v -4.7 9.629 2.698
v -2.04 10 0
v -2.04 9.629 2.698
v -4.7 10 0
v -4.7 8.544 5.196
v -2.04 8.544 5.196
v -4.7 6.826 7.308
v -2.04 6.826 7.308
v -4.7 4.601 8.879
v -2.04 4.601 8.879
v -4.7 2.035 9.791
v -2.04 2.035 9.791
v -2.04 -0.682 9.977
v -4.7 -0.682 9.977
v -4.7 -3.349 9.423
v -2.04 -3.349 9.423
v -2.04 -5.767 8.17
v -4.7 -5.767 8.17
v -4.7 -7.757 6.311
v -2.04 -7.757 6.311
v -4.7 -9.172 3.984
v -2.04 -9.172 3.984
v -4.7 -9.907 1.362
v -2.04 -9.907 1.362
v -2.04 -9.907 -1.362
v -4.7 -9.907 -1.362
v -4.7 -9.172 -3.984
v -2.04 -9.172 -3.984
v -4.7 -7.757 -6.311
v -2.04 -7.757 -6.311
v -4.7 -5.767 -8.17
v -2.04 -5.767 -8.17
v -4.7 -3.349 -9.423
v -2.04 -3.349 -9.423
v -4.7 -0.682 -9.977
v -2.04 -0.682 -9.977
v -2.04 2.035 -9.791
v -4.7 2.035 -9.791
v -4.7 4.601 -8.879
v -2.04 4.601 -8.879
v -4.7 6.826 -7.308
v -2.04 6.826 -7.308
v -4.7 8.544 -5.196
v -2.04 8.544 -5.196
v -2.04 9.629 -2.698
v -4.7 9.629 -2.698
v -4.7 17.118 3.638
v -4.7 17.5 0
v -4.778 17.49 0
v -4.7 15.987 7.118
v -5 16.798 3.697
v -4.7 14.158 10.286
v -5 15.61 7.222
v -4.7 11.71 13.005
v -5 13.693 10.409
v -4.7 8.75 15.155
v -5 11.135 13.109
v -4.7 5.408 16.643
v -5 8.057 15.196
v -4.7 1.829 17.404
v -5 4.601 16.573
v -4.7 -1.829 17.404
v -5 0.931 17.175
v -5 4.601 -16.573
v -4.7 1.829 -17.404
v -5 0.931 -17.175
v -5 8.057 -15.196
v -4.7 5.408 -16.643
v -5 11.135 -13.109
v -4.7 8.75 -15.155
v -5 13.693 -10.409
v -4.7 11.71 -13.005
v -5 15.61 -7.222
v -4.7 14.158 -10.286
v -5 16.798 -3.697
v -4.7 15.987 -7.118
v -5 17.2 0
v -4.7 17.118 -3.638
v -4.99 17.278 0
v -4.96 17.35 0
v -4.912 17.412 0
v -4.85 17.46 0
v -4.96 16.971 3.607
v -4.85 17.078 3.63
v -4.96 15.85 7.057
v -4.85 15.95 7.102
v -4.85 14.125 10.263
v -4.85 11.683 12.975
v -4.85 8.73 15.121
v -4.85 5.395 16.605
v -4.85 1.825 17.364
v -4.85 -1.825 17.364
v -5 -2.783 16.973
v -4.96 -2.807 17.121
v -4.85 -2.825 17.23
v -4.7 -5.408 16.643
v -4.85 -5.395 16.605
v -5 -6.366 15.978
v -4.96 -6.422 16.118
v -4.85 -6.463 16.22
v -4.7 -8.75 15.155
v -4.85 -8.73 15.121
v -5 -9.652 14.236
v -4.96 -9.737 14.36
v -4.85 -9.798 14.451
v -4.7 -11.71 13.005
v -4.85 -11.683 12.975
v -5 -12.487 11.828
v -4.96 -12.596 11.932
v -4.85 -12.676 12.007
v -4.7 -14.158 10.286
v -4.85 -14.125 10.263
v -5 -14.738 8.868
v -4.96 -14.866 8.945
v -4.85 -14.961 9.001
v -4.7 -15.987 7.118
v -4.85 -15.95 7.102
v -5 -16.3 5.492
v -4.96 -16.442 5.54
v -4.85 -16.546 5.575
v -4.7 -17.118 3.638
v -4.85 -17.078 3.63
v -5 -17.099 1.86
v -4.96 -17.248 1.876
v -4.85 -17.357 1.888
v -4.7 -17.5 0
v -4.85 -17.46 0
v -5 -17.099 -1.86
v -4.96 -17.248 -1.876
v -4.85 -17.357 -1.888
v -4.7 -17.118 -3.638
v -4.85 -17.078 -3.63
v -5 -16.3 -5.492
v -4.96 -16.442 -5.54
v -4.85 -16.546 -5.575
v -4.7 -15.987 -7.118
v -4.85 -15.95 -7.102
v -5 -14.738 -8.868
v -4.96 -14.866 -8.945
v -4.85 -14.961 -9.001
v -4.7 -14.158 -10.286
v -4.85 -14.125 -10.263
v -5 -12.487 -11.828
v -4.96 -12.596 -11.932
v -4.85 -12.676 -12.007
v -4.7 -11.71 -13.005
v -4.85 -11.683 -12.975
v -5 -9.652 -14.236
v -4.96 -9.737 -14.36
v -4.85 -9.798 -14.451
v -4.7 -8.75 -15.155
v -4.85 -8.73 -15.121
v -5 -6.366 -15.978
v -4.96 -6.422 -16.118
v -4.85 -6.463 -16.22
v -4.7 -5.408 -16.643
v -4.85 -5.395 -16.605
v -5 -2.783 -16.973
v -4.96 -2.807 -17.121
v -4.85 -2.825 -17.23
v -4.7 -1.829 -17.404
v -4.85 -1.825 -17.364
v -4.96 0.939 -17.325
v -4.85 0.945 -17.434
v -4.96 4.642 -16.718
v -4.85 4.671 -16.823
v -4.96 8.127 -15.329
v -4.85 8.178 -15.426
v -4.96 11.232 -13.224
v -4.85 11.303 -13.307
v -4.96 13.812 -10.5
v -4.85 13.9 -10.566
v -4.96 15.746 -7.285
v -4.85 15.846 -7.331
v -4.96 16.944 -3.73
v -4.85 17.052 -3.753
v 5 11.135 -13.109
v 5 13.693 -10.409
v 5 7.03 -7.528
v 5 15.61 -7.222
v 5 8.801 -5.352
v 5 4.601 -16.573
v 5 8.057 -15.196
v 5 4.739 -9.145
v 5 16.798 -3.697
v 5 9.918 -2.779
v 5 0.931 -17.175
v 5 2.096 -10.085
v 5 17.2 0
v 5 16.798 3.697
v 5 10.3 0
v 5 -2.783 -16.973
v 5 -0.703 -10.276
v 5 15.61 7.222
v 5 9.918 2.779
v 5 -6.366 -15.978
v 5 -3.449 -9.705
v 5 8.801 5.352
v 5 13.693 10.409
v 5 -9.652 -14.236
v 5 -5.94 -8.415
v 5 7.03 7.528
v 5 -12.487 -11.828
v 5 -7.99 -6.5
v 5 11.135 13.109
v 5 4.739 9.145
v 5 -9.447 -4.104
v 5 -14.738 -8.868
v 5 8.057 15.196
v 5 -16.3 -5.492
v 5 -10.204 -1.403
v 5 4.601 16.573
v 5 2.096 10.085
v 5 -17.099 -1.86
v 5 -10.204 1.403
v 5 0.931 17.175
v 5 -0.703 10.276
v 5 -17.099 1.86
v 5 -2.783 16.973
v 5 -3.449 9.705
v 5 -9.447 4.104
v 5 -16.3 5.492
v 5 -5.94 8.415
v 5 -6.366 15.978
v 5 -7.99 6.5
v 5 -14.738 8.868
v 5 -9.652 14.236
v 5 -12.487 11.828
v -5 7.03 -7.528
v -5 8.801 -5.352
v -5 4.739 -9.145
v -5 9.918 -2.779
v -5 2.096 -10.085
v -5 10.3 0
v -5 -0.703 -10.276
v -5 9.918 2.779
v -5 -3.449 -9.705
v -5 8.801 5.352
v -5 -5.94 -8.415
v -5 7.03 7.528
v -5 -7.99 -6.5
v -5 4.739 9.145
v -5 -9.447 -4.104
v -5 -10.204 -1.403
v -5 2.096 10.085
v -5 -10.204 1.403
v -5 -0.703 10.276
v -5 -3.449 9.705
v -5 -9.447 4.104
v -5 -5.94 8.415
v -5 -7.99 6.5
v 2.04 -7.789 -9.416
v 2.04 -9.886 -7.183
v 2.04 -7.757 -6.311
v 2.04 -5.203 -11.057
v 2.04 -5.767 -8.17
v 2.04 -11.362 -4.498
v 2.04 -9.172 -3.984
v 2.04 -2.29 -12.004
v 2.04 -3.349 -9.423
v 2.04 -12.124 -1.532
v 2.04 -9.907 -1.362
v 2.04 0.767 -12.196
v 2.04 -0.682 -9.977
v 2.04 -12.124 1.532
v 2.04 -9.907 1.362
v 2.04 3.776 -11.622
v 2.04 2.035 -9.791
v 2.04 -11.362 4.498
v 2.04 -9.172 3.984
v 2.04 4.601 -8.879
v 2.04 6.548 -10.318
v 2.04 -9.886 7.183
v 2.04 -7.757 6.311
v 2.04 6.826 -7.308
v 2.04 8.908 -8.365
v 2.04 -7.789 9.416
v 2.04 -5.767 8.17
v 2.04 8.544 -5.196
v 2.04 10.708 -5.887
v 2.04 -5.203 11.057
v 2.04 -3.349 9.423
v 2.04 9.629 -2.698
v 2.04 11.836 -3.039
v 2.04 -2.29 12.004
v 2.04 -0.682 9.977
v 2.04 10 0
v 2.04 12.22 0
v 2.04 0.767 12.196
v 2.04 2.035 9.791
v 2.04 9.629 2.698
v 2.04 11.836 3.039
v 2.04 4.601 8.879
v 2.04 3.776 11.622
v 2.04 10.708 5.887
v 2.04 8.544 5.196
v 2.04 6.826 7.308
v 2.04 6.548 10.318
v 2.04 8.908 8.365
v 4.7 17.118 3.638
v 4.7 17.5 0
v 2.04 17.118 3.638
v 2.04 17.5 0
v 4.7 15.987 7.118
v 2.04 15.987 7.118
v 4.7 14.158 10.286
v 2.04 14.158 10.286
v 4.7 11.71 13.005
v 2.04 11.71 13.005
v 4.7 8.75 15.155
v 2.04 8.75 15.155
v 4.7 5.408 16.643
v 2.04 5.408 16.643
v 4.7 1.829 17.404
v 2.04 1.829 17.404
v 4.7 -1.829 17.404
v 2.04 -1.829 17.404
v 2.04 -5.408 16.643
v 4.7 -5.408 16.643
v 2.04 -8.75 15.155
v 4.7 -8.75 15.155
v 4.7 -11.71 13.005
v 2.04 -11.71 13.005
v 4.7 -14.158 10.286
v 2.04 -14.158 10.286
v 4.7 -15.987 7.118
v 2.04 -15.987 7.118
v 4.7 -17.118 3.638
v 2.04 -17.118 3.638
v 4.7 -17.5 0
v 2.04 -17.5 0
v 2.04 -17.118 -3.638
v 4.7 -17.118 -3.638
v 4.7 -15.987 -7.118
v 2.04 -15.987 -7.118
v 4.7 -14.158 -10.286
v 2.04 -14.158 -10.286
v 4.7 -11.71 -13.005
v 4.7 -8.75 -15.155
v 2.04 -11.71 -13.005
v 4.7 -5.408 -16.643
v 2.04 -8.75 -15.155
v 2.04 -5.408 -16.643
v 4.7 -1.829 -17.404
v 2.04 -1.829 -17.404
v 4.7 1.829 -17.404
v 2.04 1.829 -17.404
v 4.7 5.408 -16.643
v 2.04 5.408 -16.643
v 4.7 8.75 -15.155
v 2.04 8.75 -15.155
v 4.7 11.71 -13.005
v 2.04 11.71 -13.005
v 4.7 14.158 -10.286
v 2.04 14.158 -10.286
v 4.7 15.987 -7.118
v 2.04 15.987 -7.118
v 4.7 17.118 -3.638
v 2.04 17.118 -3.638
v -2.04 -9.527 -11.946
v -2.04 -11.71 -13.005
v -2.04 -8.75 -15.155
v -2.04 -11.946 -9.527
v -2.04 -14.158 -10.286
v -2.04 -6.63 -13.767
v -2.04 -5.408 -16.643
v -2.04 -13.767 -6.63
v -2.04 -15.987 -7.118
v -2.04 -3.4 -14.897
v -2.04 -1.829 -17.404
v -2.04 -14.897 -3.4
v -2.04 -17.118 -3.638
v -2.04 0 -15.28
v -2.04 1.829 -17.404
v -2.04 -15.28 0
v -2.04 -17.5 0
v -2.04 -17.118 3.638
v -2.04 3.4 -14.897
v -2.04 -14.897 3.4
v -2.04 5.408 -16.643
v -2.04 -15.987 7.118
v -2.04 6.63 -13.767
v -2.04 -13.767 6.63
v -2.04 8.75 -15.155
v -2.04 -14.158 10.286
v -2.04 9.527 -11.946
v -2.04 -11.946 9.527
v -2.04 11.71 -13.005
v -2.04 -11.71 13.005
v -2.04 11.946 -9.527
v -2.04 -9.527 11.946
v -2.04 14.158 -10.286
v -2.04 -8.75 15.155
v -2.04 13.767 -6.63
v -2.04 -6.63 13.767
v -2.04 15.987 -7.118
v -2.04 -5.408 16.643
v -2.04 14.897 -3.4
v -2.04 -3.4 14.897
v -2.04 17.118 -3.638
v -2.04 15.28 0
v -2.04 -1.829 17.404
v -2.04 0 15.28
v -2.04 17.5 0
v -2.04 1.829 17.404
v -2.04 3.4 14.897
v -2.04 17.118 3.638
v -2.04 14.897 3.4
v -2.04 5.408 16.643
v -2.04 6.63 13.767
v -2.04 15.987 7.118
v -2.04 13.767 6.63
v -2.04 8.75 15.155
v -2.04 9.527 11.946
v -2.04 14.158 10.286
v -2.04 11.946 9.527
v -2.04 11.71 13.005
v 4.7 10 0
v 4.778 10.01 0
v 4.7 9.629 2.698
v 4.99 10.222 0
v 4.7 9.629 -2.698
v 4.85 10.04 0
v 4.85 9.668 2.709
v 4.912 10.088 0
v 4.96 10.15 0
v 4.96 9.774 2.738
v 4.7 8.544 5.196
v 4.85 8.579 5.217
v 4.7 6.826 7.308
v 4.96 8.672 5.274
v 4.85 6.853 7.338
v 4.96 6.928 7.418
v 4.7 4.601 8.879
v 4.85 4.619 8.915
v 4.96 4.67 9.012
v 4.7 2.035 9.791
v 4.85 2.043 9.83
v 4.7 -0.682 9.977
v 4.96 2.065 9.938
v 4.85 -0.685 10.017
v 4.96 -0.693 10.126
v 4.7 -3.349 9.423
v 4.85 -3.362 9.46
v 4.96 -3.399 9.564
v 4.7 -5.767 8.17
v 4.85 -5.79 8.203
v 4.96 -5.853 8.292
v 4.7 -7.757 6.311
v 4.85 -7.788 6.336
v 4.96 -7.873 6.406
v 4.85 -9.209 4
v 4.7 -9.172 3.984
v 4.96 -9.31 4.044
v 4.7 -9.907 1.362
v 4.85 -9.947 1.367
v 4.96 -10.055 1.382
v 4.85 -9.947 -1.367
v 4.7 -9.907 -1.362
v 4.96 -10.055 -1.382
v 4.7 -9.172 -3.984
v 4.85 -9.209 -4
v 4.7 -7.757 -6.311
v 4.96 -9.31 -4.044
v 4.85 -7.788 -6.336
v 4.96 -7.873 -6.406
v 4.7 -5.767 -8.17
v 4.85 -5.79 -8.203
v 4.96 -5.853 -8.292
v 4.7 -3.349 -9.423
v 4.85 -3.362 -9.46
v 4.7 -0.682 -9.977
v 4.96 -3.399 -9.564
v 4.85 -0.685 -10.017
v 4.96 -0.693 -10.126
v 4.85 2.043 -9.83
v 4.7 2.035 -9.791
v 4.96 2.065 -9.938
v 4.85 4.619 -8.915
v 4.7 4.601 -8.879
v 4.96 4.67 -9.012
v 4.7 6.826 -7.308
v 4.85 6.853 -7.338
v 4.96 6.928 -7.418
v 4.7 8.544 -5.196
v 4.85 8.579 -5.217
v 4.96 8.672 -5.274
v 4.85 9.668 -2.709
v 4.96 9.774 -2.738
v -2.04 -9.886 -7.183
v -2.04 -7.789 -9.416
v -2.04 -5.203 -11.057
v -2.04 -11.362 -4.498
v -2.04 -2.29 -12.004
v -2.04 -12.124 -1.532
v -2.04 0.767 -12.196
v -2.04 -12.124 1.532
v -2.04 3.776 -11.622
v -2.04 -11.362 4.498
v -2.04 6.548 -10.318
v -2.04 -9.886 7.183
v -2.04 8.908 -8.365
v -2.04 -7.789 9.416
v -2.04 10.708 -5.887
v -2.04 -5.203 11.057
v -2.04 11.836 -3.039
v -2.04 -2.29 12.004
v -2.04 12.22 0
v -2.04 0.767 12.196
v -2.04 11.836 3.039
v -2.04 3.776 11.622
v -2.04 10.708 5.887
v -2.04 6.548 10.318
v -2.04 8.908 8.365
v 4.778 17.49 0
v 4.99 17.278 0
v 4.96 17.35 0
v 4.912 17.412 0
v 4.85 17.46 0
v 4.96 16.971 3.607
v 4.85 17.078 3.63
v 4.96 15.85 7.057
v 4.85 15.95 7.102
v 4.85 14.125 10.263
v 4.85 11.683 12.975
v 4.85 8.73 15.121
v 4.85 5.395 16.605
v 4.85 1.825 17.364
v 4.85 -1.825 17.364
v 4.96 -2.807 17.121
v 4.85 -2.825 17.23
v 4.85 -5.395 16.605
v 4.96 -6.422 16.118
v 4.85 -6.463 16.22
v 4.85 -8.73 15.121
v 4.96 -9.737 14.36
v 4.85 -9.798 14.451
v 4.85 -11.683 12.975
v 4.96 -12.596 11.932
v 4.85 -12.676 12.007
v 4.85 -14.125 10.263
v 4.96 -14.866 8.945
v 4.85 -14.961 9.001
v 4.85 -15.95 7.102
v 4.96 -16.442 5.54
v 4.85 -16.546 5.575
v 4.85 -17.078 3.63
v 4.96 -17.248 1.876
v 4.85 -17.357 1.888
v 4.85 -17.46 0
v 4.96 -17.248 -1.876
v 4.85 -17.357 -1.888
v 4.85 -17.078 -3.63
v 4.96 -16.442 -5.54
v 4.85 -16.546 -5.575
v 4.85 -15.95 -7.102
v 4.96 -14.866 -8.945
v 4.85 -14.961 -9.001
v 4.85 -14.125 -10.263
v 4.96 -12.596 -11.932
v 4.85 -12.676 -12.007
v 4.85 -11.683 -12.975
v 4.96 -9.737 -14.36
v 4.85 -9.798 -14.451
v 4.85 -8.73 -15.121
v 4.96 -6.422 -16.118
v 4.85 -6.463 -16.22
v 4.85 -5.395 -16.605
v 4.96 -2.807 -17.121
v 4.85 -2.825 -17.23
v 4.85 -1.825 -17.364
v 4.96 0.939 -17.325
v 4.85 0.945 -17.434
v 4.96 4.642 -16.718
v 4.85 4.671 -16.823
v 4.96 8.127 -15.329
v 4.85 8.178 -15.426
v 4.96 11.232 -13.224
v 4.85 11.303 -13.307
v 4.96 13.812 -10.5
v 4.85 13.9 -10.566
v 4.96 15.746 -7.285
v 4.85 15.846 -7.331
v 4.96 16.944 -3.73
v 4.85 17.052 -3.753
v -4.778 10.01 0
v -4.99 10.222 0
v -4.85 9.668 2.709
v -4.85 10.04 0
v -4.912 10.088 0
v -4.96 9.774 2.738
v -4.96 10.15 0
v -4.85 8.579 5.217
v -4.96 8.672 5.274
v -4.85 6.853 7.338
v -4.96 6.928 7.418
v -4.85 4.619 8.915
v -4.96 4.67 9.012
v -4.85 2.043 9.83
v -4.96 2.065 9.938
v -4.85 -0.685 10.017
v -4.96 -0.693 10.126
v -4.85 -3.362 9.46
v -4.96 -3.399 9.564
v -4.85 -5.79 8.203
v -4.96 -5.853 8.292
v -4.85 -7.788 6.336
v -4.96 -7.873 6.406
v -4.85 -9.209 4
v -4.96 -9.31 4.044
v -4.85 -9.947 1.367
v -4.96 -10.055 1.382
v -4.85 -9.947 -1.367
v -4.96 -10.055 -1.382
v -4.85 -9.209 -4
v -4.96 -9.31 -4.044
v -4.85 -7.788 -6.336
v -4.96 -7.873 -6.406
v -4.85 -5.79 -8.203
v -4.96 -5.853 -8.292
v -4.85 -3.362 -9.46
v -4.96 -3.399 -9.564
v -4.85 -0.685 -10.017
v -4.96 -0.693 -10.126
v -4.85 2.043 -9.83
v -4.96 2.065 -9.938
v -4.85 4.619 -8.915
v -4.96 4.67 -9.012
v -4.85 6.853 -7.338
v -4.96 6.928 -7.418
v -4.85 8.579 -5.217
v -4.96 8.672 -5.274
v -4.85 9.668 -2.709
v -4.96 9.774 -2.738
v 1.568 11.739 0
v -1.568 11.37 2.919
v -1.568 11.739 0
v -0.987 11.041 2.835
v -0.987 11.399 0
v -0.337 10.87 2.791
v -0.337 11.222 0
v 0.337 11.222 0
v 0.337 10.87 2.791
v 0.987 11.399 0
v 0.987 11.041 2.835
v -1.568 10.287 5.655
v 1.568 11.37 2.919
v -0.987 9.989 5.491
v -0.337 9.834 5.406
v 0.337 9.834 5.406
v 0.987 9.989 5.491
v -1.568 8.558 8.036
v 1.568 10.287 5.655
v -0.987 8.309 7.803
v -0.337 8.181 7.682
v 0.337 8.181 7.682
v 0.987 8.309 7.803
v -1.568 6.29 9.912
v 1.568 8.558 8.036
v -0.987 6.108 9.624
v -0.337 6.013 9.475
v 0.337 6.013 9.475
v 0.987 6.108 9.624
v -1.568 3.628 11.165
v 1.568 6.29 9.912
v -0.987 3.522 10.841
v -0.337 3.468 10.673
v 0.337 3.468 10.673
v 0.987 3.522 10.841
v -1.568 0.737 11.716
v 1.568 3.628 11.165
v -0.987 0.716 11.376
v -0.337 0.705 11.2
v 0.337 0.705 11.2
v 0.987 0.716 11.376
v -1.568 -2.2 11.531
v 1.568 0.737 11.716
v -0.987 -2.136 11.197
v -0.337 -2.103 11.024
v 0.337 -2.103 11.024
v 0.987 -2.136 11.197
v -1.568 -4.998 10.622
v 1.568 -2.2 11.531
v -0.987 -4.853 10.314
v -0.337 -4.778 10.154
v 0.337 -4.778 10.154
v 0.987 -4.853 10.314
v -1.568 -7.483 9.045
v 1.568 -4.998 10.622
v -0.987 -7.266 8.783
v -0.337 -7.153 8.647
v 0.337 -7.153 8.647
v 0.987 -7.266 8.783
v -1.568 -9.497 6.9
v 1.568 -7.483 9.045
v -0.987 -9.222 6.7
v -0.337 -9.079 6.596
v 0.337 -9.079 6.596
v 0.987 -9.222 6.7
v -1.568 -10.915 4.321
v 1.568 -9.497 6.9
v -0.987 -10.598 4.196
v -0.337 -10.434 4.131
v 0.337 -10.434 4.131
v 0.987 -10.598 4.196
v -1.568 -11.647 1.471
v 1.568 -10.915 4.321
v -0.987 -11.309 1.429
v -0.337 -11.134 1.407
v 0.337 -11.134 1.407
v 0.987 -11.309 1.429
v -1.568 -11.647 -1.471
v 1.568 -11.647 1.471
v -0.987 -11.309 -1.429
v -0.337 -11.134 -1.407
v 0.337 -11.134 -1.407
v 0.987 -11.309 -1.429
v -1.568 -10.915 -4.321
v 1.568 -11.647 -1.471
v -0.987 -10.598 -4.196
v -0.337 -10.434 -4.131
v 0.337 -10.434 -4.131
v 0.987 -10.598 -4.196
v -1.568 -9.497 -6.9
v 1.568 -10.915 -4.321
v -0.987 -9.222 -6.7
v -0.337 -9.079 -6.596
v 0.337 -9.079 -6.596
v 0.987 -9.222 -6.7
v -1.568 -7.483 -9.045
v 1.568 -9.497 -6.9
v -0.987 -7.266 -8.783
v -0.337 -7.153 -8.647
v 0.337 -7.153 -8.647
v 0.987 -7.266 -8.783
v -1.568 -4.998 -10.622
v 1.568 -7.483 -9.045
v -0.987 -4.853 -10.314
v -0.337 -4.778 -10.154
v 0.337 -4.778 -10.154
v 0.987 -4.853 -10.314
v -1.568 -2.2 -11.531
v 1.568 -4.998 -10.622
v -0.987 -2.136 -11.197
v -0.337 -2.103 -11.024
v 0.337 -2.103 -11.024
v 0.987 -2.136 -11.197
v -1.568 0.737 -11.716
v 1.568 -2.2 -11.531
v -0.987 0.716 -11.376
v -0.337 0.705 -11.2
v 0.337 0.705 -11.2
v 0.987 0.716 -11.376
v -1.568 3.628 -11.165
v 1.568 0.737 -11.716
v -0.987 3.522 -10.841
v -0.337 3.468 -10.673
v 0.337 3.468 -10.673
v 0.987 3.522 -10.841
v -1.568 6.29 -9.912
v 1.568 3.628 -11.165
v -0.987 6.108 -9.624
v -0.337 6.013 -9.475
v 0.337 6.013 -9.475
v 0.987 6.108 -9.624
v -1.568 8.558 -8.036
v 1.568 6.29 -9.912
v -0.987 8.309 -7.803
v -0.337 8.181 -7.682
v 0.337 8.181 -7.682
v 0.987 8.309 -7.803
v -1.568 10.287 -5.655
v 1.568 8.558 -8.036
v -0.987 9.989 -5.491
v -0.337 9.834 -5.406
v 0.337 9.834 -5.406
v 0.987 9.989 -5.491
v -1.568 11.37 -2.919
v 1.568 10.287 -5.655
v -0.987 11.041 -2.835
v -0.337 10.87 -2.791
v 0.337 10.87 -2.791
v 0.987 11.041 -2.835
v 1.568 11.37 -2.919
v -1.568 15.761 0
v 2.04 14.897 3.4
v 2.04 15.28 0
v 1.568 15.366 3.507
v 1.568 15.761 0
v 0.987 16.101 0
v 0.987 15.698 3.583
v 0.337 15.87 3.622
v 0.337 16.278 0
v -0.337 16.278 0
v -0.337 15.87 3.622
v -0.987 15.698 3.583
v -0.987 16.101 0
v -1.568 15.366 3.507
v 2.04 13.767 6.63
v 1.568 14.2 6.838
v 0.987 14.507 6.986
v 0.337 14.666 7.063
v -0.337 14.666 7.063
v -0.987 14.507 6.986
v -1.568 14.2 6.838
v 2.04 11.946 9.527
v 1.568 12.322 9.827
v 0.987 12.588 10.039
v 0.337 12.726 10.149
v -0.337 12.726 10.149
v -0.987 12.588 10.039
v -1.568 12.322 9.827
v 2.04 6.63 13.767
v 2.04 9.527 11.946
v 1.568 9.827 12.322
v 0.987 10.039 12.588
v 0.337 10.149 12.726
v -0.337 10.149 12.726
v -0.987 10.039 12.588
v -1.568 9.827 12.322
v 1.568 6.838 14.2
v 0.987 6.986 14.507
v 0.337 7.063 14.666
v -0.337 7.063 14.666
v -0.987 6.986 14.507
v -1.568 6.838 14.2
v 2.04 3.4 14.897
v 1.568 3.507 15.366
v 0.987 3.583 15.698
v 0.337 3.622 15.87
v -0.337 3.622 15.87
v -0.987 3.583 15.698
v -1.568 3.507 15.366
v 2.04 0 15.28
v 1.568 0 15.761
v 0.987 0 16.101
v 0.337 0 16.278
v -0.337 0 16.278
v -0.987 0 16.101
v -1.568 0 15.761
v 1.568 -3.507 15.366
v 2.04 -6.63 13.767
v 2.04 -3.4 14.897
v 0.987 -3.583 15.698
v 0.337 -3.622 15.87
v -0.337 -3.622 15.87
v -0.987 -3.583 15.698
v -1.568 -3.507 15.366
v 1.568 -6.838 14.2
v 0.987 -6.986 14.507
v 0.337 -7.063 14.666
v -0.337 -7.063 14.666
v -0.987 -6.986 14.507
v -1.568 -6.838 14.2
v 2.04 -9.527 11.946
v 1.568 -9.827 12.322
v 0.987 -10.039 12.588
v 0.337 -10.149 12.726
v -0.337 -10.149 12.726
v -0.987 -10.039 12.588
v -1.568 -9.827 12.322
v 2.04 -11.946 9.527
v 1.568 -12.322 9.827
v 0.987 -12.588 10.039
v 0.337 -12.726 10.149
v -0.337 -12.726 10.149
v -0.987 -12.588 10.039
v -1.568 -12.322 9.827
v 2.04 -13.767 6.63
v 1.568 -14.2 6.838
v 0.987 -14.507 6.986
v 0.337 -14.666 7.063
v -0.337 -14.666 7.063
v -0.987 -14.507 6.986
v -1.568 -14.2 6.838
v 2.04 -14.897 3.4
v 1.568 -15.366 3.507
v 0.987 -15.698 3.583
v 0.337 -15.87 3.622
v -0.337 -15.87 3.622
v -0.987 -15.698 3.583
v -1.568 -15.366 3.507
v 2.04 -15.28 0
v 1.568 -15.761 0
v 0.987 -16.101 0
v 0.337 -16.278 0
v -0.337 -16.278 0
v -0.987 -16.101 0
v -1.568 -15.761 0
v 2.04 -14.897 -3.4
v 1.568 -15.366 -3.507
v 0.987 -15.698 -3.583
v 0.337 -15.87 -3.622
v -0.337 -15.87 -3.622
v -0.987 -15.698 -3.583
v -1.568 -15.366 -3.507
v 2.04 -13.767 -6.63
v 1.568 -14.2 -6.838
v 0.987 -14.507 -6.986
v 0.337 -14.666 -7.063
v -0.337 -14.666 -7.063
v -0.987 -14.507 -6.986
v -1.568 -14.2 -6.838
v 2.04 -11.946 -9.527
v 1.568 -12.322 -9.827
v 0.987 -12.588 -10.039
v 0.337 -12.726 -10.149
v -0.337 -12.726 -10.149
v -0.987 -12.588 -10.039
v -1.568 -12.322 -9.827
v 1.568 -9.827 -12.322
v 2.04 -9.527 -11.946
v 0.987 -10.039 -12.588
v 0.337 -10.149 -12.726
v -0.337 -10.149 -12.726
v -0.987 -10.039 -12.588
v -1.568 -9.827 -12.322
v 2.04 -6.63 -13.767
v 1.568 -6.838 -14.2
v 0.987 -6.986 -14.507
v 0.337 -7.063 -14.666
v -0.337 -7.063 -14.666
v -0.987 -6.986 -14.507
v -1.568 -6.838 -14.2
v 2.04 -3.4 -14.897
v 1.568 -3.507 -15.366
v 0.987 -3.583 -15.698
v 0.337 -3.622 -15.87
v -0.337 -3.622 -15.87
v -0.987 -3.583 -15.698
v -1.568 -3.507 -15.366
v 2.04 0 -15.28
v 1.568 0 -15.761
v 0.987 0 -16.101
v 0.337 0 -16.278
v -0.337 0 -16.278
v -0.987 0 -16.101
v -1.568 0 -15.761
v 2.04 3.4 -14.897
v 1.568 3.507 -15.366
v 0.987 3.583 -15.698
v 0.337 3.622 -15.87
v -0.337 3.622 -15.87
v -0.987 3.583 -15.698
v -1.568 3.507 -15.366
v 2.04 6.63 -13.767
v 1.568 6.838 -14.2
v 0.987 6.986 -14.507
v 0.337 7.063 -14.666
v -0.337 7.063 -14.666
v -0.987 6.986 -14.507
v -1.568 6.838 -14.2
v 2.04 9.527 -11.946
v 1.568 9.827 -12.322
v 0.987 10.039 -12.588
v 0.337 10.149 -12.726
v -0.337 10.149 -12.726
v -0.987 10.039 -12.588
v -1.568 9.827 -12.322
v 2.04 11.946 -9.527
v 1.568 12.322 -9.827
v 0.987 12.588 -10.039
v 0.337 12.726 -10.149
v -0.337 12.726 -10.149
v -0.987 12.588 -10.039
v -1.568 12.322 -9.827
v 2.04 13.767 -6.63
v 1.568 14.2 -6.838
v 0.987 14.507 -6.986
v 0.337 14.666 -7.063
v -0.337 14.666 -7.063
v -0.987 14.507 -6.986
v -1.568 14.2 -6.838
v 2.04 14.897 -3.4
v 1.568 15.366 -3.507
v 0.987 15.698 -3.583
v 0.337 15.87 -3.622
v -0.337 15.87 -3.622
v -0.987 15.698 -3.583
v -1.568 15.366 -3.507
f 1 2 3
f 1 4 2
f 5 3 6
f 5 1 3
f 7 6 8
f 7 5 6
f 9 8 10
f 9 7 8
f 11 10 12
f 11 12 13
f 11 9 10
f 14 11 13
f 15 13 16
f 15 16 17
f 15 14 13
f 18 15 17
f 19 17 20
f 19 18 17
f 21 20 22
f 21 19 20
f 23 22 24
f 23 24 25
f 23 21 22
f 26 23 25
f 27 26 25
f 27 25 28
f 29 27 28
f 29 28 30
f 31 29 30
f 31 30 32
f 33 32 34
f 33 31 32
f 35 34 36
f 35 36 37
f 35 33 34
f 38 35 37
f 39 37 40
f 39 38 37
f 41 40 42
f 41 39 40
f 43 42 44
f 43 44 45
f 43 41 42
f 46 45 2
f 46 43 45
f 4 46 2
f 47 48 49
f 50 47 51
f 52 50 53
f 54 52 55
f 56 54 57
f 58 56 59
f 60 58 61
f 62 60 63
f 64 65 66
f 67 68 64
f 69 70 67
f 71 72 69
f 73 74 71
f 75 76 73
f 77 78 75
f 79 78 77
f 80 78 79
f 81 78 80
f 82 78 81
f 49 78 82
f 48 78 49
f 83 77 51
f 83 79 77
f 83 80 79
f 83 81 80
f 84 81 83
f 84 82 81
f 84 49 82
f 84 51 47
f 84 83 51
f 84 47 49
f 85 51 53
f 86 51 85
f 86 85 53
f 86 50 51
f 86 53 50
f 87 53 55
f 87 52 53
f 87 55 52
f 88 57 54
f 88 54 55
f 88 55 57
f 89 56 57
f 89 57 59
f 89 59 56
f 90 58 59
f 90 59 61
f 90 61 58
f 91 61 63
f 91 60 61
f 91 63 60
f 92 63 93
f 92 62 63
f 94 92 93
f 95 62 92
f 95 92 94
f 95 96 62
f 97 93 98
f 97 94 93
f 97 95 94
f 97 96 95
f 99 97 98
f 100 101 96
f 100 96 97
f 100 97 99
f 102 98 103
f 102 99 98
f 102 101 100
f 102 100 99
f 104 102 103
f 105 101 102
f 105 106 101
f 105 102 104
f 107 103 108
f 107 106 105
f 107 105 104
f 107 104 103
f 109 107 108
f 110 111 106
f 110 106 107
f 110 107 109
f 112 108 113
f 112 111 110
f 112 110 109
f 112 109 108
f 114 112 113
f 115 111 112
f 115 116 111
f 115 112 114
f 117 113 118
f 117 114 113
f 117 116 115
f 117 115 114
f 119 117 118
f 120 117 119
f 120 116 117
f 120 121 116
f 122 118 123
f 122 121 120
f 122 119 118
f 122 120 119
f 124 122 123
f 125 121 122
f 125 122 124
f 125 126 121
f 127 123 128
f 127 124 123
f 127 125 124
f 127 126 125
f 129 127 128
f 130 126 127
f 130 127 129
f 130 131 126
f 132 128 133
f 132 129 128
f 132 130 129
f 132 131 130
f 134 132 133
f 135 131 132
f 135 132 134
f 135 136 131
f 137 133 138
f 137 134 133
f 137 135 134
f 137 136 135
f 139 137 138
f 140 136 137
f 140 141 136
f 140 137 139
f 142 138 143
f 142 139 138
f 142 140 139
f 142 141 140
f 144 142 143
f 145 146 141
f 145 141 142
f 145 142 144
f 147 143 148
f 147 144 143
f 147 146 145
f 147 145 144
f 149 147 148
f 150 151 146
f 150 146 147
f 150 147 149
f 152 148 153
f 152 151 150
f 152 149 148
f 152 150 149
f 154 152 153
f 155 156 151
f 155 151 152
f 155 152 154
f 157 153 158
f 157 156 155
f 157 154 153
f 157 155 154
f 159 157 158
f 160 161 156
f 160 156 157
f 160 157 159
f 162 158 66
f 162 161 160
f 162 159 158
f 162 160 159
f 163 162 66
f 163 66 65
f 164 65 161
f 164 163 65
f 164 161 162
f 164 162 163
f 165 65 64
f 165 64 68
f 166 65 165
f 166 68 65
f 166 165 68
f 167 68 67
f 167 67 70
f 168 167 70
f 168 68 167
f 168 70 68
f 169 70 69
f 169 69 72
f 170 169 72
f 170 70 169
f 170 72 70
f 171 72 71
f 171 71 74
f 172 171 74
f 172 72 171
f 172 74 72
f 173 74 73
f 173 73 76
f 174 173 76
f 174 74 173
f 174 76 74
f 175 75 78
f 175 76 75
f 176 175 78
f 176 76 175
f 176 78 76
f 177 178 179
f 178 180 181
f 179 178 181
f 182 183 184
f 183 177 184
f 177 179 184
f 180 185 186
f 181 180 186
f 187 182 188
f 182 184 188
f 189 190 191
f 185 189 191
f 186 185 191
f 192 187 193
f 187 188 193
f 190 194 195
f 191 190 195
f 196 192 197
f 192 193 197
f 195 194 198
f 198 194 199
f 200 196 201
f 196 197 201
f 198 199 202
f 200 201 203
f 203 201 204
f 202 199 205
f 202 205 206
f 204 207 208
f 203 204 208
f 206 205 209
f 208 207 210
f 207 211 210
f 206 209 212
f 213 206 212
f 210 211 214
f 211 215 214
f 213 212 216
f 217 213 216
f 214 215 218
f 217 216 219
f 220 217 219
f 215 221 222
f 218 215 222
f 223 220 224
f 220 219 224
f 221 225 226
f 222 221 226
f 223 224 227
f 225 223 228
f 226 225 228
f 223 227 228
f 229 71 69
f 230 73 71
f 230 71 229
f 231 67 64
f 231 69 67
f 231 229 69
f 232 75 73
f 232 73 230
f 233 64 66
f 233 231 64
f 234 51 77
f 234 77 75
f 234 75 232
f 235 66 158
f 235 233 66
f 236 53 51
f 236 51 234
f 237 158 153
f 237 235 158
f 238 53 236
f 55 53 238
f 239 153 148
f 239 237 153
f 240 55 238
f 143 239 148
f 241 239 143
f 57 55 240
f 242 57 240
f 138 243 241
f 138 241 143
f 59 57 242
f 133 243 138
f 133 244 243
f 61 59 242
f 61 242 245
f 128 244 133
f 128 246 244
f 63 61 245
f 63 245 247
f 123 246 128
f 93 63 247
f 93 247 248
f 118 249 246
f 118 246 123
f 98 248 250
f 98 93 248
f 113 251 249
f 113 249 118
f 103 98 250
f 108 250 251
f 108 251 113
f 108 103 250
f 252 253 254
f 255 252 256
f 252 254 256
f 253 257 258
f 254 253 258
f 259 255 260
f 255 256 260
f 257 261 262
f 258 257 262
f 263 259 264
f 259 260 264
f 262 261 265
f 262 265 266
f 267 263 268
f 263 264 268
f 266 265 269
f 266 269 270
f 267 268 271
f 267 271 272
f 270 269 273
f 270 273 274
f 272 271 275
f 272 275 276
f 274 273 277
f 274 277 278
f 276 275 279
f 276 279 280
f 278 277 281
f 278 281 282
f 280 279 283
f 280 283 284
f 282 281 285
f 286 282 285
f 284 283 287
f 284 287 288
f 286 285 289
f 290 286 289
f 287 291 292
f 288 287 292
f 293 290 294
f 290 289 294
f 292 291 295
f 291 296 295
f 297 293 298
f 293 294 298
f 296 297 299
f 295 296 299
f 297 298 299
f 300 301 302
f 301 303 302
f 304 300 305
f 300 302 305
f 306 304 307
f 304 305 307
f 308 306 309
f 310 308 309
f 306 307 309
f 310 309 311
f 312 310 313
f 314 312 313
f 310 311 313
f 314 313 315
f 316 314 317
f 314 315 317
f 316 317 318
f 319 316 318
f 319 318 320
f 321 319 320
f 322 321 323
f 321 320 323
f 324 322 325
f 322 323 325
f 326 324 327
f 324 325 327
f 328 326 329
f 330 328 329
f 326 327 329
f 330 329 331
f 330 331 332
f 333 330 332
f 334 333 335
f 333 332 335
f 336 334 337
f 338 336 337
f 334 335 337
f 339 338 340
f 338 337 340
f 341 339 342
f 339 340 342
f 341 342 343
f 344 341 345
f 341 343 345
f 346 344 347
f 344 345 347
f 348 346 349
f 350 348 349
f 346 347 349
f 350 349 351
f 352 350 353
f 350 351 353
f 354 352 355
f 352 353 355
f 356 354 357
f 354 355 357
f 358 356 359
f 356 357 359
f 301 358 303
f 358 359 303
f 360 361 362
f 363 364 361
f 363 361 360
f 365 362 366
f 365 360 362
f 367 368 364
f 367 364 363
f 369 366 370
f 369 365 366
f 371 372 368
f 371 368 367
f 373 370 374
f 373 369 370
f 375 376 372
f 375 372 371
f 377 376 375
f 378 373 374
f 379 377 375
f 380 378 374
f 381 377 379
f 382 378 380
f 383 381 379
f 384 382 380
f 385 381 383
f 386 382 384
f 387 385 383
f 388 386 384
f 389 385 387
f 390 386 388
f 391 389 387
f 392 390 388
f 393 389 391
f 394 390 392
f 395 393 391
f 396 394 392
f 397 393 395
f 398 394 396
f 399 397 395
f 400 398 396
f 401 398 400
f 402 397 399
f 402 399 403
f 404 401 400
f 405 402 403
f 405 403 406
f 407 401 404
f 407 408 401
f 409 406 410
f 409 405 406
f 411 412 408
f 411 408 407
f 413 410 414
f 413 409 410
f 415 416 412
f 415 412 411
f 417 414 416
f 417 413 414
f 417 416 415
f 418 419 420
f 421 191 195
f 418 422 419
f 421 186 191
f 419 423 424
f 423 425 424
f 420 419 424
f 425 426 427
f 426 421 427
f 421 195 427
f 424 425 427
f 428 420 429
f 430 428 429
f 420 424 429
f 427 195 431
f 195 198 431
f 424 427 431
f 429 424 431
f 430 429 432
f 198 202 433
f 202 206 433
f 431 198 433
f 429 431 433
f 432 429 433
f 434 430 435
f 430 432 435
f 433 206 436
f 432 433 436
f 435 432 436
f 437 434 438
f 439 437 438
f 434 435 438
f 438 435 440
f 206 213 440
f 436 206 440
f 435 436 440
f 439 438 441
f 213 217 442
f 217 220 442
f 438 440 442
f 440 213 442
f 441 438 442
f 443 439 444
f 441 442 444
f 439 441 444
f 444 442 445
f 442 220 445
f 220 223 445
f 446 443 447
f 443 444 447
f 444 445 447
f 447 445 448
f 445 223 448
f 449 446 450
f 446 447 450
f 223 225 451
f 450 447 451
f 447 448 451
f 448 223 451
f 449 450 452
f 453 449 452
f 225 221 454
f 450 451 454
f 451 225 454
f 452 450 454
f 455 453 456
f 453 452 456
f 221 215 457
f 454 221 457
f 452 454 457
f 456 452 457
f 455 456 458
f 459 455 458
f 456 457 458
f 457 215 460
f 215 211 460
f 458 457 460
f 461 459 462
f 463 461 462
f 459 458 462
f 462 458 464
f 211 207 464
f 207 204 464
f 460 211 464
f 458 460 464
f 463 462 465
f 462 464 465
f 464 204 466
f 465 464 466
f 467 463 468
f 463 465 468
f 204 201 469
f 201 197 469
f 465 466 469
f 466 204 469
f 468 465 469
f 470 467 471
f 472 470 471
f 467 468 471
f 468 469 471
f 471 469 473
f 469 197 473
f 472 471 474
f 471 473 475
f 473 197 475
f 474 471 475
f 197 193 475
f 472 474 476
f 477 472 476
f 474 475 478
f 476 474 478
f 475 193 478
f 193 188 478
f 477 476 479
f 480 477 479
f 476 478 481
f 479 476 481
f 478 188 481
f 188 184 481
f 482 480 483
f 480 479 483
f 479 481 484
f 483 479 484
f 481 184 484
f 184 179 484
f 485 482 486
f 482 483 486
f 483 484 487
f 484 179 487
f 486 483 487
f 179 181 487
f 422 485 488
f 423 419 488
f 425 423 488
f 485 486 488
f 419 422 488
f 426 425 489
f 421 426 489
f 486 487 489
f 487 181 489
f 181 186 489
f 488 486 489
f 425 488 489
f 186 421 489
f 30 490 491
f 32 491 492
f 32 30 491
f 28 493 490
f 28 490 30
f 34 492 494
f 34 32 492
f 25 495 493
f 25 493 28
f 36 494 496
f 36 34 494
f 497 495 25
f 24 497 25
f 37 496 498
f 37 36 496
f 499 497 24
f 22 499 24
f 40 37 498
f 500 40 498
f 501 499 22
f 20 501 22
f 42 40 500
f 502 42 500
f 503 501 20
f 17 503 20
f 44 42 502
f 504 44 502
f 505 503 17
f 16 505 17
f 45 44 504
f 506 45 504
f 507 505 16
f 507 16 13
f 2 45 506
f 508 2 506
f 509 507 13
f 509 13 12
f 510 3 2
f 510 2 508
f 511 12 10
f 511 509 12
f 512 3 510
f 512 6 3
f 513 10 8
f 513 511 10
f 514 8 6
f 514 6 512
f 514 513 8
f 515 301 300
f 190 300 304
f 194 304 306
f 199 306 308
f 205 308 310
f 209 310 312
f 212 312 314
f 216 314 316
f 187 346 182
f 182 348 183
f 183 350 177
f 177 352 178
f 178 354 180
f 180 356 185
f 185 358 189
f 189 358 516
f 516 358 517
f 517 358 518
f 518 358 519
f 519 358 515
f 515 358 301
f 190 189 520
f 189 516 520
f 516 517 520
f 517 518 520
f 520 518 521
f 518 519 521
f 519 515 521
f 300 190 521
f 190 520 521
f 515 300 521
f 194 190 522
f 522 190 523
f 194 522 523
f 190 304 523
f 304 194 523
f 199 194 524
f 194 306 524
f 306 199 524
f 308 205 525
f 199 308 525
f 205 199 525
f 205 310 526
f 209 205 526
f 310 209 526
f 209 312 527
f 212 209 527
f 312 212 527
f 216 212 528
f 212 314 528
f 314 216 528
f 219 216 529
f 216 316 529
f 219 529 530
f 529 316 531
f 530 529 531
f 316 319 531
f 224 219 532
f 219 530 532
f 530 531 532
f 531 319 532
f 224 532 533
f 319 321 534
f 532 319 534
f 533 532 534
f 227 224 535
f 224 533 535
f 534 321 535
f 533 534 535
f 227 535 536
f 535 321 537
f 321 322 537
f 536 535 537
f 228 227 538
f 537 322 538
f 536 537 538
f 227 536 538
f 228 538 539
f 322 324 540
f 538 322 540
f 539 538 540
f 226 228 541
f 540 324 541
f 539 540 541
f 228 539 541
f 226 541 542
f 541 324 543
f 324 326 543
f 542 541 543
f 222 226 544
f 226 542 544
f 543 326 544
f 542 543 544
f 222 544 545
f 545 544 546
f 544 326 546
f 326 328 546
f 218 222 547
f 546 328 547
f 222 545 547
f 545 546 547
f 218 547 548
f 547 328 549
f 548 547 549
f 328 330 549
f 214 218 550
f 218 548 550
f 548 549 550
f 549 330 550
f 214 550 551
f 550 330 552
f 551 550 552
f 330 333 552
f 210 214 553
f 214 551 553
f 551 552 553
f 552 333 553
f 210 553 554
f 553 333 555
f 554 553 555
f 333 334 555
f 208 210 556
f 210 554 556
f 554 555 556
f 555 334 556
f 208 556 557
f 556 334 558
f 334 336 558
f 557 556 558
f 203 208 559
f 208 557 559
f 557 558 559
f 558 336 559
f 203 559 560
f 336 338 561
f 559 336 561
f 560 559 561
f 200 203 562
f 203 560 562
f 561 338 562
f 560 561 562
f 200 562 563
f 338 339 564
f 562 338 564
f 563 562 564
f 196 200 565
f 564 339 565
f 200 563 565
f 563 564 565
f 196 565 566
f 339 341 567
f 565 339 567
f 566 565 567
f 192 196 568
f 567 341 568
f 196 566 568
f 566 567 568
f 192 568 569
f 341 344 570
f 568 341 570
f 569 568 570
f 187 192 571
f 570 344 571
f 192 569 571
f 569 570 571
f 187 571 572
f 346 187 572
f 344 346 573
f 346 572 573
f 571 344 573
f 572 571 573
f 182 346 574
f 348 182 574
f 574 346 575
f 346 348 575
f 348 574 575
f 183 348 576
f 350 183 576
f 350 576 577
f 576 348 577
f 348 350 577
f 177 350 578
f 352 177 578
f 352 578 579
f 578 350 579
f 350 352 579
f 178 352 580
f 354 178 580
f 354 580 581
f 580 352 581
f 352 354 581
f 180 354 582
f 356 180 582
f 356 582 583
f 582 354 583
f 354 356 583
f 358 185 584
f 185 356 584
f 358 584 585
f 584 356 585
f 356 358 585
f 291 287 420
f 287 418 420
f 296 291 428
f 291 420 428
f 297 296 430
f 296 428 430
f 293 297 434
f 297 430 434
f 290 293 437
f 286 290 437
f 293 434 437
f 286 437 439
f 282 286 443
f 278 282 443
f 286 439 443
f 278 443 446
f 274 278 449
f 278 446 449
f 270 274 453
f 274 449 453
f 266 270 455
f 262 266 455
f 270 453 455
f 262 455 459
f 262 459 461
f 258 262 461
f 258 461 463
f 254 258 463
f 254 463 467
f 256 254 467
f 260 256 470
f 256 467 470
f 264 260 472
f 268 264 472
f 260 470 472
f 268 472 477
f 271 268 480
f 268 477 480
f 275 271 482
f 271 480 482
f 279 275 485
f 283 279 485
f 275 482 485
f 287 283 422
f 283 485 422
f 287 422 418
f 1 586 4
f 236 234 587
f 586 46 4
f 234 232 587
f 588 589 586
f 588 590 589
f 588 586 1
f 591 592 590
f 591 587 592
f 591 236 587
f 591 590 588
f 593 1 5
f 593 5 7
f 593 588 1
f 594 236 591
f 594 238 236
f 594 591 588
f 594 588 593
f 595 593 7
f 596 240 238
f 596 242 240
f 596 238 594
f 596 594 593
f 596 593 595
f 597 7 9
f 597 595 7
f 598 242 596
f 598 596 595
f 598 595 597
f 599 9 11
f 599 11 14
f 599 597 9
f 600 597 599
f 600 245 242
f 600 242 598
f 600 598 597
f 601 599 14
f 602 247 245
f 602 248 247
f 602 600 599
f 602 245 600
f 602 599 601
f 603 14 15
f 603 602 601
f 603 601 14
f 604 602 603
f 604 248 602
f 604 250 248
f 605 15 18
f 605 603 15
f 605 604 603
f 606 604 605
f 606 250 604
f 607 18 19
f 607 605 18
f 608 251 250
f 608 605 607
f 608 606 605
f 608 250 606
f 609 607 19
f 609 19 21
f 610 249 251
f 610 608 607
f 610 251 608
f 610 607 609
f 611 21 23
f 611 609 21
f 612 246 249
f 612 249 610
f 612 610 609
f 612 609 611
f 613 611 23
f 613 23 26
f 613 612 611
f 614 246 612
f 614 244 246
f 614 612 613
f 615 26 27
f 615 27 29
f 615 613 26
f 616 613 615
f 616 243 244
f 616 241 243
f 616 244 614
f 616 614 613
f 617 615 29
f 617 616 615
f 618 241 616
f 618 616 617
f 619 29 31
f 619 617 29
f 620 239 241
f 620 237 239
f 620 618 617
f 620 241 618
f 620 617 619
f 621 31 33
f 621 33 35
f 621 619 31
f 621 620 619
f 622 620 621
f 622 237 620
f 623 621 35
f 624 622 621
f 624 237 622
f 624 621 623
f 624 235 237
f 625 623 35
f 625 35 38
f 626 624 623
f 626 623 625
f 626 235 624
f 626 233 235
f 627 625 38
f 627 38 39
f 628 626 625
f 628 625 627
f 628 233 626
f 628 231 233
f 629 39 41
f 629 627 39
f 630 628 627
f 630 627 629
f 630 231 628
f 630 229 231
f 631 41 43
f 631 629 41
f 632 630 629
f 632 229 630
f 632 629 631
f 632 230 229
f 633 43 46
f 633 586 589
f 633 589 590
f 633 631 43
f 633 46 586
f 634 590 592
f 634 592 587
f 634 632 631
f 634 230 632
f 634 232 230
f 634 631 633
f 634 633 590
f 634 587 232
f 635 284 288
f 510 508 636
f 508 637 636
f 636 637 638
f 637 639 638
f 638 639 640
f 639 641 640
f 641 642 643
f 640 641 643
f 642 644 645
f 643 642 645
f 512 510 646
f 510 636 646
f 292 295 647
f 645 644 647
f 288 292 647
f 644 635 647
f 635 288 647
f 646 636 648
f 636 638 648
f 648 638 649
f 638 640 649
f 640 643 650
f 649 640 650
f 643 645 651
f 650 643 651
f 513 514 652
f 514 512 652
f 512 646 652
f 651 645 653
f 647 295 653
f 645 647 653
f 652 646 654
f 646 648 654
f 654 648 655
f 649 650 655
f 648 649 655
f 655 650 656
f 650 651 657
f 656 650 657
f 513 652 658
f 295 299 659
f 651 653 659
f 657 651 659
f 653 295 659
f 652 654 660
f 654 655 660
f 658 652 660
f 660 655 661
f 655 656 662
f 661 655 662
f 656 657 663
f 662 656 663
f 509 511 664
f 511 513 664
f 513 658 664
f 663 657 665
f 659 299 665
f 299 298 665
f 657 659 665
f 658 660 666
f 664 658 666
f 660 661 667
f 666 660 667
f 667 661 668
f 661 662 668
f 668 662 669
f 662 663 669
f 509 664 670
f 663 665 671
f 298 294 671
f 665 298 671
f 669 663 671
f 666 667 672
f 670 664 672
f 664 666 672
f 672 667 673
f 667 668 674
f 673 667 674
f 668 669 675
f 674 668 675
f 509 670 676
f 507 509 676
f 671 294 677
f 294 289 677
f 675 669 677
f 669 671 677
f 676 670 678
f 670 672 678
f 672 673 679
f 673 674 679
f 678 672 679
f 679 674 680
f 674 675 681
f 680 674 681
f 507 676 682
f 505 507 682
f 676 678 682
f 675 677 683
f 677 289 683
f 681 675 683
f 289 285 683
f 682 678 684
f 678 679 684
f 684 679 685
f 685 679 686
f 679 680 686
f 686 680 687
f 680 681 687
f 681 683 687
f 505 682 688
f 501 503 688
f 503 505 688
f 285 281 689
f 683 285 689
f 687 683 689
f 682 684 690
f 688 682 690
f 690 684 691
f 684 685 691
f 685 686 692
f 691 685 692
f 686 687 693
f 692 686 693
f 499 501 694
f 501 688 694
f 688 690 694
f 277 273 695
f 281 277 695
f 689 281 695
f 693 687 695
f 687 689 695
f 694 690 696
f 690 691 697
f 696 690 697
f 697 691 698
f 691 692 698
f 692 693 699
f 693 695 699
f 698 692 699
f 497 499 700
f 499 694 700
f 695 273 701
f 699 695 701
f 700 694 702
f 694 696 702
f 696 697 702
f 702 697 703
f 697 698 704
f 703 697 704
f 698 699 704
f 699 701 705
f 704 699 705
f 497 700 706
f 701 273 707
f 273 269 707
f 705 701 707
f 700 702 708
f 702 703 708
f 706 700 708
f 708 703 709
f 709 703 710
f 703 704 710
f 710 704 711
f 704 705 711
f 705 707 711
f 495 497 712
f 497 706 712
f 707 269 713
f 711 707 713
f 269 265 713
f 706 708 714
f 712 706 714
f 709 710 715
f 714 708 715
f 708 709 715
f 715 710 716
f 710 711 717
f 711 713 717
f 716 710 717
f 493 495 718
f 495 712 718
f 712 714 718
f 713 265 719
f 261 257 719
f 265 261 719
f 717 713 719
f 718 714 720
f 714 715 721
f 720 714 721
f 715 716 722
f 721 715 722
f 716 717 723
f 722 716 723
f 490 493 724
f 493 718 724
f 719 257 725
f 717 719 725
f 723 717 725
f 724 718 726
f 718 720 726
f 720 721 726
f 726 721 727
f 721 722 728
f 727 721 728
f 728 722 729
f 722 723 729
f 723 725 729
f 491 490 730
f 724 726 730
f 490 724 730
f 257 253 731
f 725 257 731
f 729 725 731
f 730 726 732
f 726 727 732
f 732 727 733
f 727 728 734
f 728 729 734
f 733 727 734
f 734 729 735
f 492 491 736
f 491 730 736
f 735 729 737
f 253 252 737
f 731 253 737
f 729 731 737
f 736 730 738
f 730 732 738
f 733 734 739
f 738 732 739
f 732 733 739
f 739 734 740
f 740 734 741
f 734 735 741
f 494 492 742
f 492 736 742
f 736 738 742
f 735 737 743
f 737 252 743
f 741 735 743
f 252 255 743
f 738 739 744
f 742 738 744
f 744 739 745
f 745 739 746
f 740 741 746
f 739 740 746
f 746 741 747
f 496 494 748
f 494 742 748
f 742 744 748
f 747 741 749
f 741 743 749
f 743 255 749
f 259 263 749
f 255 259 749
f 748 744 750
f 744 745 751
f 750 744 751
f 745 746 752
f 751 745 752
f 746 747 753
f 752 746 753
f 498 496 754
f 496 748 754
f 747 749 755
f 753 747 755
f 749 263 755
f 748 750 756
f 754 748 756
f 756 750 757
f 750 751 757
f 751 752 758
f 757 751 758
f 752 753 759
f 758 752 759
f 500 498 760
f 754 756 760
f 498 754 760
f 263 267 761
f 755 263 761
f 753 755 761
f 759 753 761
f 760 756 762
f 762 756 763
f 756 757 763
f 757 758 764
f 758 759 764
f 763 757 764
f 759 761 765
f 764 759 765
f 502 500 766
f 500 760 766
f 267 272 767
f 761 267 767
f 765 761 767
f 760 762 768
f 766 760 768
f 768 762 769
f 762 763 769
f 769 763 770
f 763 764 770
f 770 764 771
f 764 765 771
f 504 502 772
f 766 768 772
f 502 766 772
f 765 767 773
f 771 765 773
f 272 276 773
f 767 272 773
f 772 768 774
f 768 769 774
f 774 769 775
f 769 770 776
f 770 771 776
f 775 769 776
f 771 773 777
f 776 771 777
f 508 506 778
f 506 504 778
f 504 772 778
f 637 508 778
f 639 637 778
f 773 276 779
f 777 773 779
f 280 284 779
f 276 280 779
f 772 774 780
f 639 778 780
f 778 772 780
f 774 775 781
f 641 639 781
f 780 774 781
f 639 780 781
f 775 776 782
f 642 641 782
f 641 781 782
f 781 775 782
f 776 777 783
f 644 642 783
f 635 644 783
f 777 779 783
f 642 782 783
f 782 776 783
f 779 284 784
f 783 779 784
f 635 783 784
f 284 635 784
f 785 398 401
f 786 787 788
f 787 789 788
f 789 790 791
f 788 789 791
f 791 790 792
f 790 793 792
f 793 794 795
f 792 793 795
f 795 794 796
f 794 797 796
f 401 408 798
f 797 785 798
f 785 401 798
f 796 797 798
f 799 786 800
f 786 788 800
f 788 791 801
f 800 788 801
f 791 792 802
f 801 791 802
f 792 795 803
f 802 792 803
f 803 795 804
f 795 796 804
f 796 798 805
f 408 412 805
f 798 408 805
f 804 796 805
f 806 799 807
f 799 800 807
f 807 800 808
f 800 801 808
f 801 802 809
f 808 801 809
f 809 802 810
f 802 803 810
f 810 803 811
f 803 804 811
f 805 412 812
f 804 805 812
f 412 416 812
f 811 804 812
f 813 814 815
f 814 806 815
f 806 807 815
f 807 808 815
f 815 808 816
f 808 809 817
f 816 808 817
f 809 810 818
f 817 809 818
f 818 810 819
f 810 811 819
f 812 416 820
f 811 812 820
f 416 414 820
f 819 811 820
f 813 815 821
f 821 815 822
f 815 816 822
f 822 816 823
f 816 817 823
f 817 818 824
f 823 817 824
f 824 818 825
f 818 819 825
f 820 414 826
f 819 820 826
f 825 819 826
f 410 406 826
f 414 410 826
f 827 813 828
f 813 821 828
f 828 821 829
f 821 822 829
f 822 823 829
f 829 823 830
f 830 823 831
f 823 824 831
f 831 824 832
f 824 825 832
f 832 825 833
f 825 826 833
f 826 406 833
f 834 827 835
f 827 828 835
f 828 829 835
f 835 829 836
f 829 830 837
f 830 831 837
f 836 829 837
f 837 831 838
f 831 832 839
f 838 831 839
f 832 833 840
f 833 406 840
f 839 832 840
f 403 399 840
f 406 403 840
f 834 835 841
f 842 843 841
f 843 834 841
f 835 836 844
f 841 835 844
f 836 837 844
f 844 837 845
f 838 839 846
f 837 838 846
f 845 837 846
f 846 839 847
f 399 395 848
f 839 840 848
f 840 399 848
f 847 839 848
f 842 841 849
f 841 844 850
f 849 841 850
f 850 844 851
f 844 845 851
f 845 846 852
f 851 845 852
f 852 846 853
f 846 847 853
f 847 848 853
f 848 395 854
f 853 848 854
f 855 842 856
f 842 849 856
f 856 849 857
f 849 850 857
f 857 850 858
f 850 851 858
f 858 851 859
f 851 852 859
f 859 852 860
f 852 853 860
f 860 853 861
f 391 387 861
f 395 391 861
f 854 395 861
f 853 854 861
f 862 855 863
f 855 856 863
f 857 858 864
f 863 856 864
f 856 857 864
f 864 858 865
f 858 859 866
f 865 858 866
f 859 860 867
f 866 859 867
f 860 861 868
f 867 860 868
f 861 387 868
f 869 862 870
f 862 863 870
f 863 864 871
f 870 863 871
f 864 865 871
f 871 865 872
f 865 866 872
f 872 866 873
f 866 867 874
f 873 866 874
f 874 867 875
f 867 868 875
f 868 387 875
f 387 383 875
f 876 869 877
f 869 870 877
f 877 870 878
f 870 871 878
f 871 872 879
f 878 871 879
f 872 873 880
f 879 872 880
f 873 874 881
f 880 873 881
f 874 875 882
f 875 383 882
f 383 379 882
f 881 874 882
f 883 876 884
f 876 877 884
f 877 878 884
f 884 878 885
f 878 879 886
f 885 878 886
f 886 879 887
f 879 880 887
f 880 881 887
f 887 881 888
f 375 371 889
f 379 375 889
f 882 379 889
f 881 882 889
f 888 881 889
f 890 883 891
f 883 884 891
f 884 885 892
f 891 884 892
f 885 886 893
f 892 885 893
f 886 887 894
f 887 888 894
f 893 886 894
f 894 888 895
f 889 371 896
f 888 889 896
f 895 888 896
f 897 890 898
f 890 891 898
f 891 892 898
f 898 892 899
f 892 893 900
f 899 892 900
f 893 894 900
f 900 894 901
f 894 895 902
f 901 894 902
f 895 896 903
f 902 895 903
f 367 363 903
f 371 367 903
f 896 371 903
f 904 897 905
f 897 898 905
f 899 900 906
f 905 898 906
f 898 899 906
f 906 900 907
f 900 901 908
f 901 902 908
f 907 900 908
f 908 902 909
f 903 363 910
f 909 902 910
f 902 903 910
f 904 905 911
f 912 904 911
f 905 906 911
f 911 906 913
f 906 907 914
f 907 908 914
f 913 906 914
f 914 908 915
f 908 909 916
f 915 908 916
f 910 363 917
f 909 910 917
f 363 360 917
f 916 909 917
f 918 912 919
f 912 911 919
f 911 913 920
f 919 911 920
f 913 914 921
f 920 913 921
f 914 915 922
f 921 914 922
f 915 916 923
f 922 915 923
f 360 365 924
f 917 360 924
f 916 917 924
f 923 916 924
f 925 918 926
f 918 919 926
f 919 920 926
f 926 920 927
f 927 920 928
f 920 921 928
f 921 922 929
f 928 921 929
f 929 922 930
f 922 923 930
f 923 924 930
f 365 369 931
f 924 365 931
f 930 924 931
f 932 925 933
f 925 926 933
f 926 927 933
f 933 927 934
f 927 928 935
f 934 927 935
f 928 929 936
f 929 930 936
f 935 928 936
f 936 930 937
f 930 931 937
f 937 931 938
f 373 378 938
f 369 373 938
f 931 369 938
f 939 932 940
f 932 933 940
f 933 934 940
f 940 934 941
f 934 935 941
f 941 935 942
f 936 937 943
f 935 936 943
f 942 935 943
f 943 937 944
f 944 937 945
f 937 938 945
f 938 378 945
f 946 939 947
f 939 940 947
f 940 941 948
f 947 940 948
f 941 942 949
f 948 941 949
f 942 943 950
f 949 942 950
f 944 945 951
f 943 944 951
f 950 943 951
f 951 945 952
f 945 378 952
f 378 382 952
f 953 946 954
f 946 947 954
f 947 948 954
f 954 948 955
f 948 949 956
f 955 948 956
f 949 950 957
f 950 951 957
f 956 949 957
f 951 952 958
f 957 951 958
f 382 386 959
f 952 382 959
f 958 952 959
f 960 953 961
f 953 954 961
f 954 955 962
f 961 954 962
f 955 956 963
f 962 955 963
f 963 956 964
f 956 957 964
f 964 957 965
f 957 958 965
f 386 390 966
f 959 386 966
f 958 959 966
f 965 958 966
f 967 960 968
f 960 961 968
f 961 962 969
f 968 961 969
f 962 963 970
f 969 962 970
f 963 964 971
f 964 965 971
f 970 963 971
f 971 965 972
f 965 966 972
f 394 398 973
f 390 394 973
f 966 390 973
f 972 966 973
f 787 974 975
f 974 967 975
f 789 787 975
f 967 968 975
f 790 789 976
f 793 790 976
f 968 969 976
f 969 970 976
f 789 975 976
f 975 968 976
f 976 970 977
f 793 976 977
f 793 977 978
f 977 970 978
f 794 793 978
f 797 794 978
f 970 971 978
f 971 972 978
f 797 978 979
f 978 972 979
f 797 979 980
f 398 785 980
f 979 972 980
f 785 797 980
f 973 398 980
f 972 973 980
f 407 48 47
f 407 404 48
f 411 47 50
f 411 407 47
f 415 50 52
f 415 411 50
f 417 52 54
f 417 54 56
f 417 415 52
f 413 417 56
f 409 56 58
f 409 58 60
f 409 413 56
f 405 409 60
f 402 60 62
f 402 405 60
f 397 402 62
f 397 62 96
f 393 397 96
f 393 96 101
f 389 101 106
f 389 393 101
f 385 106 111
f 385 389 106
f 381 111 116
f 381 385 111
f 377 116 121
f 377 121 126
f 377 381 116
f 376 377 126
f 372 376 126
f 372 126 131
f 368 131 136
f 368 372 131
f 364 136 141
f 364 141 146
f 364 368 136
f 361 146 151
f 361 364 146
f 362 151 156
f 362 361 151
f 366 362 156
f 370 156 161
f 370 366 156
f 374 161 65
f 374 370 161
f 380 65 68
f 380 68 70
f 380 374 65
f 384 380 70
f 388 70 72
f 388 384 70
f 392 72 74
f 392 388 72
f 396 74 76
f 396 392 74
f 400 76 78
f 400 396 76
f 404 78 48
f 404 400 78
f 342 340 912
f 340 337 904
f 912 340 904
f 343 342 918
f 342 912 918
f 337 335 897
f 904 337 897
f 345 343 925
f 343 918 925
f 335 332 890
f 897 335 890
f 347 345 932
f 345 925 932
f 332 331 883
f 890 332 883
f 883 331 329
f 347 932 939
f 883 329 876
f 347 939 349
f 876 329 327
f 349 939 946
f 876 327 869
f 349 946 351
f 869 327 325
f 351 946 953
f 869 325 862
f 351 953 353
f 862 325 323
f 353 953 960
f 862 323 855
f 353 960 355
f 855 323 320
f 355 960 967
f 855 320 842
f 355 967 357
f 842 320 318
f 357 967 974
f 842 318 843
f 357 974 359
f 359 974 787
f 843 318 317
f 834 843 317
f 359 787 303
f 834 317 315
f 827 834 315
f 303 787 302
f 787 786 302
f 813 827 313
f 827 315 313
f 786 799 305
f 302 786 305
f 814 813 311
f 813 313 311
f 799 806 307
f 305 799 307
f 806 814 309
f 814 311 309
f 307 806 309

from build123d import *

# Parameters (mm, degrees)
BALSIMSKE_R = 2.55


with BuildPart() as part:
    # InnRacSke → Race (revolve)
    with BuildSketch(Plane.XY):
        with BuildLine():
            Line((-2.04, 12.262039987), (-2.04, 10))
            Line((-2.04, 10), (-4.7, 10))
            ThreePointArc((-4.7, 10), (-4.912132034, 10.087867966), (-5, 10.3))
            Line((-5, 10.3), (-5, 17.2))
            ThreePointArc((-5, 17.2), (-4.912132034, 17.412132034), (-4.7, 17.5))
            Line((-4.7, 17.5), (-2.04, 17.5))
            Line((-2.04, 17.5), (-2.04, 15.237960013))
            ThreePointArc((-2.04, 15.237960013), (-2.525, 13.75), (-2.04, 12.262039987))
        make_face()
    race = revolve(axis=Axis((-34.925, 0, 0), (1, 0, 0)))

    # BalSimSke → BallsSimplified (revolve)
    with BuildSketch(Plane.XY):
        with Locations((0, 13.75)):
            Circle(BALSIMSKE_R)
    revolve(axis=Axis((-25.4, 0, 0), (1, 0, 0)))

    # Mirror1: Race across plane
    add(race.mirror(Plane(origin=(0, 0, 0), x_dir=(0, 0, 1), z_dir=(1, 0, 0))))


solid = part.part
